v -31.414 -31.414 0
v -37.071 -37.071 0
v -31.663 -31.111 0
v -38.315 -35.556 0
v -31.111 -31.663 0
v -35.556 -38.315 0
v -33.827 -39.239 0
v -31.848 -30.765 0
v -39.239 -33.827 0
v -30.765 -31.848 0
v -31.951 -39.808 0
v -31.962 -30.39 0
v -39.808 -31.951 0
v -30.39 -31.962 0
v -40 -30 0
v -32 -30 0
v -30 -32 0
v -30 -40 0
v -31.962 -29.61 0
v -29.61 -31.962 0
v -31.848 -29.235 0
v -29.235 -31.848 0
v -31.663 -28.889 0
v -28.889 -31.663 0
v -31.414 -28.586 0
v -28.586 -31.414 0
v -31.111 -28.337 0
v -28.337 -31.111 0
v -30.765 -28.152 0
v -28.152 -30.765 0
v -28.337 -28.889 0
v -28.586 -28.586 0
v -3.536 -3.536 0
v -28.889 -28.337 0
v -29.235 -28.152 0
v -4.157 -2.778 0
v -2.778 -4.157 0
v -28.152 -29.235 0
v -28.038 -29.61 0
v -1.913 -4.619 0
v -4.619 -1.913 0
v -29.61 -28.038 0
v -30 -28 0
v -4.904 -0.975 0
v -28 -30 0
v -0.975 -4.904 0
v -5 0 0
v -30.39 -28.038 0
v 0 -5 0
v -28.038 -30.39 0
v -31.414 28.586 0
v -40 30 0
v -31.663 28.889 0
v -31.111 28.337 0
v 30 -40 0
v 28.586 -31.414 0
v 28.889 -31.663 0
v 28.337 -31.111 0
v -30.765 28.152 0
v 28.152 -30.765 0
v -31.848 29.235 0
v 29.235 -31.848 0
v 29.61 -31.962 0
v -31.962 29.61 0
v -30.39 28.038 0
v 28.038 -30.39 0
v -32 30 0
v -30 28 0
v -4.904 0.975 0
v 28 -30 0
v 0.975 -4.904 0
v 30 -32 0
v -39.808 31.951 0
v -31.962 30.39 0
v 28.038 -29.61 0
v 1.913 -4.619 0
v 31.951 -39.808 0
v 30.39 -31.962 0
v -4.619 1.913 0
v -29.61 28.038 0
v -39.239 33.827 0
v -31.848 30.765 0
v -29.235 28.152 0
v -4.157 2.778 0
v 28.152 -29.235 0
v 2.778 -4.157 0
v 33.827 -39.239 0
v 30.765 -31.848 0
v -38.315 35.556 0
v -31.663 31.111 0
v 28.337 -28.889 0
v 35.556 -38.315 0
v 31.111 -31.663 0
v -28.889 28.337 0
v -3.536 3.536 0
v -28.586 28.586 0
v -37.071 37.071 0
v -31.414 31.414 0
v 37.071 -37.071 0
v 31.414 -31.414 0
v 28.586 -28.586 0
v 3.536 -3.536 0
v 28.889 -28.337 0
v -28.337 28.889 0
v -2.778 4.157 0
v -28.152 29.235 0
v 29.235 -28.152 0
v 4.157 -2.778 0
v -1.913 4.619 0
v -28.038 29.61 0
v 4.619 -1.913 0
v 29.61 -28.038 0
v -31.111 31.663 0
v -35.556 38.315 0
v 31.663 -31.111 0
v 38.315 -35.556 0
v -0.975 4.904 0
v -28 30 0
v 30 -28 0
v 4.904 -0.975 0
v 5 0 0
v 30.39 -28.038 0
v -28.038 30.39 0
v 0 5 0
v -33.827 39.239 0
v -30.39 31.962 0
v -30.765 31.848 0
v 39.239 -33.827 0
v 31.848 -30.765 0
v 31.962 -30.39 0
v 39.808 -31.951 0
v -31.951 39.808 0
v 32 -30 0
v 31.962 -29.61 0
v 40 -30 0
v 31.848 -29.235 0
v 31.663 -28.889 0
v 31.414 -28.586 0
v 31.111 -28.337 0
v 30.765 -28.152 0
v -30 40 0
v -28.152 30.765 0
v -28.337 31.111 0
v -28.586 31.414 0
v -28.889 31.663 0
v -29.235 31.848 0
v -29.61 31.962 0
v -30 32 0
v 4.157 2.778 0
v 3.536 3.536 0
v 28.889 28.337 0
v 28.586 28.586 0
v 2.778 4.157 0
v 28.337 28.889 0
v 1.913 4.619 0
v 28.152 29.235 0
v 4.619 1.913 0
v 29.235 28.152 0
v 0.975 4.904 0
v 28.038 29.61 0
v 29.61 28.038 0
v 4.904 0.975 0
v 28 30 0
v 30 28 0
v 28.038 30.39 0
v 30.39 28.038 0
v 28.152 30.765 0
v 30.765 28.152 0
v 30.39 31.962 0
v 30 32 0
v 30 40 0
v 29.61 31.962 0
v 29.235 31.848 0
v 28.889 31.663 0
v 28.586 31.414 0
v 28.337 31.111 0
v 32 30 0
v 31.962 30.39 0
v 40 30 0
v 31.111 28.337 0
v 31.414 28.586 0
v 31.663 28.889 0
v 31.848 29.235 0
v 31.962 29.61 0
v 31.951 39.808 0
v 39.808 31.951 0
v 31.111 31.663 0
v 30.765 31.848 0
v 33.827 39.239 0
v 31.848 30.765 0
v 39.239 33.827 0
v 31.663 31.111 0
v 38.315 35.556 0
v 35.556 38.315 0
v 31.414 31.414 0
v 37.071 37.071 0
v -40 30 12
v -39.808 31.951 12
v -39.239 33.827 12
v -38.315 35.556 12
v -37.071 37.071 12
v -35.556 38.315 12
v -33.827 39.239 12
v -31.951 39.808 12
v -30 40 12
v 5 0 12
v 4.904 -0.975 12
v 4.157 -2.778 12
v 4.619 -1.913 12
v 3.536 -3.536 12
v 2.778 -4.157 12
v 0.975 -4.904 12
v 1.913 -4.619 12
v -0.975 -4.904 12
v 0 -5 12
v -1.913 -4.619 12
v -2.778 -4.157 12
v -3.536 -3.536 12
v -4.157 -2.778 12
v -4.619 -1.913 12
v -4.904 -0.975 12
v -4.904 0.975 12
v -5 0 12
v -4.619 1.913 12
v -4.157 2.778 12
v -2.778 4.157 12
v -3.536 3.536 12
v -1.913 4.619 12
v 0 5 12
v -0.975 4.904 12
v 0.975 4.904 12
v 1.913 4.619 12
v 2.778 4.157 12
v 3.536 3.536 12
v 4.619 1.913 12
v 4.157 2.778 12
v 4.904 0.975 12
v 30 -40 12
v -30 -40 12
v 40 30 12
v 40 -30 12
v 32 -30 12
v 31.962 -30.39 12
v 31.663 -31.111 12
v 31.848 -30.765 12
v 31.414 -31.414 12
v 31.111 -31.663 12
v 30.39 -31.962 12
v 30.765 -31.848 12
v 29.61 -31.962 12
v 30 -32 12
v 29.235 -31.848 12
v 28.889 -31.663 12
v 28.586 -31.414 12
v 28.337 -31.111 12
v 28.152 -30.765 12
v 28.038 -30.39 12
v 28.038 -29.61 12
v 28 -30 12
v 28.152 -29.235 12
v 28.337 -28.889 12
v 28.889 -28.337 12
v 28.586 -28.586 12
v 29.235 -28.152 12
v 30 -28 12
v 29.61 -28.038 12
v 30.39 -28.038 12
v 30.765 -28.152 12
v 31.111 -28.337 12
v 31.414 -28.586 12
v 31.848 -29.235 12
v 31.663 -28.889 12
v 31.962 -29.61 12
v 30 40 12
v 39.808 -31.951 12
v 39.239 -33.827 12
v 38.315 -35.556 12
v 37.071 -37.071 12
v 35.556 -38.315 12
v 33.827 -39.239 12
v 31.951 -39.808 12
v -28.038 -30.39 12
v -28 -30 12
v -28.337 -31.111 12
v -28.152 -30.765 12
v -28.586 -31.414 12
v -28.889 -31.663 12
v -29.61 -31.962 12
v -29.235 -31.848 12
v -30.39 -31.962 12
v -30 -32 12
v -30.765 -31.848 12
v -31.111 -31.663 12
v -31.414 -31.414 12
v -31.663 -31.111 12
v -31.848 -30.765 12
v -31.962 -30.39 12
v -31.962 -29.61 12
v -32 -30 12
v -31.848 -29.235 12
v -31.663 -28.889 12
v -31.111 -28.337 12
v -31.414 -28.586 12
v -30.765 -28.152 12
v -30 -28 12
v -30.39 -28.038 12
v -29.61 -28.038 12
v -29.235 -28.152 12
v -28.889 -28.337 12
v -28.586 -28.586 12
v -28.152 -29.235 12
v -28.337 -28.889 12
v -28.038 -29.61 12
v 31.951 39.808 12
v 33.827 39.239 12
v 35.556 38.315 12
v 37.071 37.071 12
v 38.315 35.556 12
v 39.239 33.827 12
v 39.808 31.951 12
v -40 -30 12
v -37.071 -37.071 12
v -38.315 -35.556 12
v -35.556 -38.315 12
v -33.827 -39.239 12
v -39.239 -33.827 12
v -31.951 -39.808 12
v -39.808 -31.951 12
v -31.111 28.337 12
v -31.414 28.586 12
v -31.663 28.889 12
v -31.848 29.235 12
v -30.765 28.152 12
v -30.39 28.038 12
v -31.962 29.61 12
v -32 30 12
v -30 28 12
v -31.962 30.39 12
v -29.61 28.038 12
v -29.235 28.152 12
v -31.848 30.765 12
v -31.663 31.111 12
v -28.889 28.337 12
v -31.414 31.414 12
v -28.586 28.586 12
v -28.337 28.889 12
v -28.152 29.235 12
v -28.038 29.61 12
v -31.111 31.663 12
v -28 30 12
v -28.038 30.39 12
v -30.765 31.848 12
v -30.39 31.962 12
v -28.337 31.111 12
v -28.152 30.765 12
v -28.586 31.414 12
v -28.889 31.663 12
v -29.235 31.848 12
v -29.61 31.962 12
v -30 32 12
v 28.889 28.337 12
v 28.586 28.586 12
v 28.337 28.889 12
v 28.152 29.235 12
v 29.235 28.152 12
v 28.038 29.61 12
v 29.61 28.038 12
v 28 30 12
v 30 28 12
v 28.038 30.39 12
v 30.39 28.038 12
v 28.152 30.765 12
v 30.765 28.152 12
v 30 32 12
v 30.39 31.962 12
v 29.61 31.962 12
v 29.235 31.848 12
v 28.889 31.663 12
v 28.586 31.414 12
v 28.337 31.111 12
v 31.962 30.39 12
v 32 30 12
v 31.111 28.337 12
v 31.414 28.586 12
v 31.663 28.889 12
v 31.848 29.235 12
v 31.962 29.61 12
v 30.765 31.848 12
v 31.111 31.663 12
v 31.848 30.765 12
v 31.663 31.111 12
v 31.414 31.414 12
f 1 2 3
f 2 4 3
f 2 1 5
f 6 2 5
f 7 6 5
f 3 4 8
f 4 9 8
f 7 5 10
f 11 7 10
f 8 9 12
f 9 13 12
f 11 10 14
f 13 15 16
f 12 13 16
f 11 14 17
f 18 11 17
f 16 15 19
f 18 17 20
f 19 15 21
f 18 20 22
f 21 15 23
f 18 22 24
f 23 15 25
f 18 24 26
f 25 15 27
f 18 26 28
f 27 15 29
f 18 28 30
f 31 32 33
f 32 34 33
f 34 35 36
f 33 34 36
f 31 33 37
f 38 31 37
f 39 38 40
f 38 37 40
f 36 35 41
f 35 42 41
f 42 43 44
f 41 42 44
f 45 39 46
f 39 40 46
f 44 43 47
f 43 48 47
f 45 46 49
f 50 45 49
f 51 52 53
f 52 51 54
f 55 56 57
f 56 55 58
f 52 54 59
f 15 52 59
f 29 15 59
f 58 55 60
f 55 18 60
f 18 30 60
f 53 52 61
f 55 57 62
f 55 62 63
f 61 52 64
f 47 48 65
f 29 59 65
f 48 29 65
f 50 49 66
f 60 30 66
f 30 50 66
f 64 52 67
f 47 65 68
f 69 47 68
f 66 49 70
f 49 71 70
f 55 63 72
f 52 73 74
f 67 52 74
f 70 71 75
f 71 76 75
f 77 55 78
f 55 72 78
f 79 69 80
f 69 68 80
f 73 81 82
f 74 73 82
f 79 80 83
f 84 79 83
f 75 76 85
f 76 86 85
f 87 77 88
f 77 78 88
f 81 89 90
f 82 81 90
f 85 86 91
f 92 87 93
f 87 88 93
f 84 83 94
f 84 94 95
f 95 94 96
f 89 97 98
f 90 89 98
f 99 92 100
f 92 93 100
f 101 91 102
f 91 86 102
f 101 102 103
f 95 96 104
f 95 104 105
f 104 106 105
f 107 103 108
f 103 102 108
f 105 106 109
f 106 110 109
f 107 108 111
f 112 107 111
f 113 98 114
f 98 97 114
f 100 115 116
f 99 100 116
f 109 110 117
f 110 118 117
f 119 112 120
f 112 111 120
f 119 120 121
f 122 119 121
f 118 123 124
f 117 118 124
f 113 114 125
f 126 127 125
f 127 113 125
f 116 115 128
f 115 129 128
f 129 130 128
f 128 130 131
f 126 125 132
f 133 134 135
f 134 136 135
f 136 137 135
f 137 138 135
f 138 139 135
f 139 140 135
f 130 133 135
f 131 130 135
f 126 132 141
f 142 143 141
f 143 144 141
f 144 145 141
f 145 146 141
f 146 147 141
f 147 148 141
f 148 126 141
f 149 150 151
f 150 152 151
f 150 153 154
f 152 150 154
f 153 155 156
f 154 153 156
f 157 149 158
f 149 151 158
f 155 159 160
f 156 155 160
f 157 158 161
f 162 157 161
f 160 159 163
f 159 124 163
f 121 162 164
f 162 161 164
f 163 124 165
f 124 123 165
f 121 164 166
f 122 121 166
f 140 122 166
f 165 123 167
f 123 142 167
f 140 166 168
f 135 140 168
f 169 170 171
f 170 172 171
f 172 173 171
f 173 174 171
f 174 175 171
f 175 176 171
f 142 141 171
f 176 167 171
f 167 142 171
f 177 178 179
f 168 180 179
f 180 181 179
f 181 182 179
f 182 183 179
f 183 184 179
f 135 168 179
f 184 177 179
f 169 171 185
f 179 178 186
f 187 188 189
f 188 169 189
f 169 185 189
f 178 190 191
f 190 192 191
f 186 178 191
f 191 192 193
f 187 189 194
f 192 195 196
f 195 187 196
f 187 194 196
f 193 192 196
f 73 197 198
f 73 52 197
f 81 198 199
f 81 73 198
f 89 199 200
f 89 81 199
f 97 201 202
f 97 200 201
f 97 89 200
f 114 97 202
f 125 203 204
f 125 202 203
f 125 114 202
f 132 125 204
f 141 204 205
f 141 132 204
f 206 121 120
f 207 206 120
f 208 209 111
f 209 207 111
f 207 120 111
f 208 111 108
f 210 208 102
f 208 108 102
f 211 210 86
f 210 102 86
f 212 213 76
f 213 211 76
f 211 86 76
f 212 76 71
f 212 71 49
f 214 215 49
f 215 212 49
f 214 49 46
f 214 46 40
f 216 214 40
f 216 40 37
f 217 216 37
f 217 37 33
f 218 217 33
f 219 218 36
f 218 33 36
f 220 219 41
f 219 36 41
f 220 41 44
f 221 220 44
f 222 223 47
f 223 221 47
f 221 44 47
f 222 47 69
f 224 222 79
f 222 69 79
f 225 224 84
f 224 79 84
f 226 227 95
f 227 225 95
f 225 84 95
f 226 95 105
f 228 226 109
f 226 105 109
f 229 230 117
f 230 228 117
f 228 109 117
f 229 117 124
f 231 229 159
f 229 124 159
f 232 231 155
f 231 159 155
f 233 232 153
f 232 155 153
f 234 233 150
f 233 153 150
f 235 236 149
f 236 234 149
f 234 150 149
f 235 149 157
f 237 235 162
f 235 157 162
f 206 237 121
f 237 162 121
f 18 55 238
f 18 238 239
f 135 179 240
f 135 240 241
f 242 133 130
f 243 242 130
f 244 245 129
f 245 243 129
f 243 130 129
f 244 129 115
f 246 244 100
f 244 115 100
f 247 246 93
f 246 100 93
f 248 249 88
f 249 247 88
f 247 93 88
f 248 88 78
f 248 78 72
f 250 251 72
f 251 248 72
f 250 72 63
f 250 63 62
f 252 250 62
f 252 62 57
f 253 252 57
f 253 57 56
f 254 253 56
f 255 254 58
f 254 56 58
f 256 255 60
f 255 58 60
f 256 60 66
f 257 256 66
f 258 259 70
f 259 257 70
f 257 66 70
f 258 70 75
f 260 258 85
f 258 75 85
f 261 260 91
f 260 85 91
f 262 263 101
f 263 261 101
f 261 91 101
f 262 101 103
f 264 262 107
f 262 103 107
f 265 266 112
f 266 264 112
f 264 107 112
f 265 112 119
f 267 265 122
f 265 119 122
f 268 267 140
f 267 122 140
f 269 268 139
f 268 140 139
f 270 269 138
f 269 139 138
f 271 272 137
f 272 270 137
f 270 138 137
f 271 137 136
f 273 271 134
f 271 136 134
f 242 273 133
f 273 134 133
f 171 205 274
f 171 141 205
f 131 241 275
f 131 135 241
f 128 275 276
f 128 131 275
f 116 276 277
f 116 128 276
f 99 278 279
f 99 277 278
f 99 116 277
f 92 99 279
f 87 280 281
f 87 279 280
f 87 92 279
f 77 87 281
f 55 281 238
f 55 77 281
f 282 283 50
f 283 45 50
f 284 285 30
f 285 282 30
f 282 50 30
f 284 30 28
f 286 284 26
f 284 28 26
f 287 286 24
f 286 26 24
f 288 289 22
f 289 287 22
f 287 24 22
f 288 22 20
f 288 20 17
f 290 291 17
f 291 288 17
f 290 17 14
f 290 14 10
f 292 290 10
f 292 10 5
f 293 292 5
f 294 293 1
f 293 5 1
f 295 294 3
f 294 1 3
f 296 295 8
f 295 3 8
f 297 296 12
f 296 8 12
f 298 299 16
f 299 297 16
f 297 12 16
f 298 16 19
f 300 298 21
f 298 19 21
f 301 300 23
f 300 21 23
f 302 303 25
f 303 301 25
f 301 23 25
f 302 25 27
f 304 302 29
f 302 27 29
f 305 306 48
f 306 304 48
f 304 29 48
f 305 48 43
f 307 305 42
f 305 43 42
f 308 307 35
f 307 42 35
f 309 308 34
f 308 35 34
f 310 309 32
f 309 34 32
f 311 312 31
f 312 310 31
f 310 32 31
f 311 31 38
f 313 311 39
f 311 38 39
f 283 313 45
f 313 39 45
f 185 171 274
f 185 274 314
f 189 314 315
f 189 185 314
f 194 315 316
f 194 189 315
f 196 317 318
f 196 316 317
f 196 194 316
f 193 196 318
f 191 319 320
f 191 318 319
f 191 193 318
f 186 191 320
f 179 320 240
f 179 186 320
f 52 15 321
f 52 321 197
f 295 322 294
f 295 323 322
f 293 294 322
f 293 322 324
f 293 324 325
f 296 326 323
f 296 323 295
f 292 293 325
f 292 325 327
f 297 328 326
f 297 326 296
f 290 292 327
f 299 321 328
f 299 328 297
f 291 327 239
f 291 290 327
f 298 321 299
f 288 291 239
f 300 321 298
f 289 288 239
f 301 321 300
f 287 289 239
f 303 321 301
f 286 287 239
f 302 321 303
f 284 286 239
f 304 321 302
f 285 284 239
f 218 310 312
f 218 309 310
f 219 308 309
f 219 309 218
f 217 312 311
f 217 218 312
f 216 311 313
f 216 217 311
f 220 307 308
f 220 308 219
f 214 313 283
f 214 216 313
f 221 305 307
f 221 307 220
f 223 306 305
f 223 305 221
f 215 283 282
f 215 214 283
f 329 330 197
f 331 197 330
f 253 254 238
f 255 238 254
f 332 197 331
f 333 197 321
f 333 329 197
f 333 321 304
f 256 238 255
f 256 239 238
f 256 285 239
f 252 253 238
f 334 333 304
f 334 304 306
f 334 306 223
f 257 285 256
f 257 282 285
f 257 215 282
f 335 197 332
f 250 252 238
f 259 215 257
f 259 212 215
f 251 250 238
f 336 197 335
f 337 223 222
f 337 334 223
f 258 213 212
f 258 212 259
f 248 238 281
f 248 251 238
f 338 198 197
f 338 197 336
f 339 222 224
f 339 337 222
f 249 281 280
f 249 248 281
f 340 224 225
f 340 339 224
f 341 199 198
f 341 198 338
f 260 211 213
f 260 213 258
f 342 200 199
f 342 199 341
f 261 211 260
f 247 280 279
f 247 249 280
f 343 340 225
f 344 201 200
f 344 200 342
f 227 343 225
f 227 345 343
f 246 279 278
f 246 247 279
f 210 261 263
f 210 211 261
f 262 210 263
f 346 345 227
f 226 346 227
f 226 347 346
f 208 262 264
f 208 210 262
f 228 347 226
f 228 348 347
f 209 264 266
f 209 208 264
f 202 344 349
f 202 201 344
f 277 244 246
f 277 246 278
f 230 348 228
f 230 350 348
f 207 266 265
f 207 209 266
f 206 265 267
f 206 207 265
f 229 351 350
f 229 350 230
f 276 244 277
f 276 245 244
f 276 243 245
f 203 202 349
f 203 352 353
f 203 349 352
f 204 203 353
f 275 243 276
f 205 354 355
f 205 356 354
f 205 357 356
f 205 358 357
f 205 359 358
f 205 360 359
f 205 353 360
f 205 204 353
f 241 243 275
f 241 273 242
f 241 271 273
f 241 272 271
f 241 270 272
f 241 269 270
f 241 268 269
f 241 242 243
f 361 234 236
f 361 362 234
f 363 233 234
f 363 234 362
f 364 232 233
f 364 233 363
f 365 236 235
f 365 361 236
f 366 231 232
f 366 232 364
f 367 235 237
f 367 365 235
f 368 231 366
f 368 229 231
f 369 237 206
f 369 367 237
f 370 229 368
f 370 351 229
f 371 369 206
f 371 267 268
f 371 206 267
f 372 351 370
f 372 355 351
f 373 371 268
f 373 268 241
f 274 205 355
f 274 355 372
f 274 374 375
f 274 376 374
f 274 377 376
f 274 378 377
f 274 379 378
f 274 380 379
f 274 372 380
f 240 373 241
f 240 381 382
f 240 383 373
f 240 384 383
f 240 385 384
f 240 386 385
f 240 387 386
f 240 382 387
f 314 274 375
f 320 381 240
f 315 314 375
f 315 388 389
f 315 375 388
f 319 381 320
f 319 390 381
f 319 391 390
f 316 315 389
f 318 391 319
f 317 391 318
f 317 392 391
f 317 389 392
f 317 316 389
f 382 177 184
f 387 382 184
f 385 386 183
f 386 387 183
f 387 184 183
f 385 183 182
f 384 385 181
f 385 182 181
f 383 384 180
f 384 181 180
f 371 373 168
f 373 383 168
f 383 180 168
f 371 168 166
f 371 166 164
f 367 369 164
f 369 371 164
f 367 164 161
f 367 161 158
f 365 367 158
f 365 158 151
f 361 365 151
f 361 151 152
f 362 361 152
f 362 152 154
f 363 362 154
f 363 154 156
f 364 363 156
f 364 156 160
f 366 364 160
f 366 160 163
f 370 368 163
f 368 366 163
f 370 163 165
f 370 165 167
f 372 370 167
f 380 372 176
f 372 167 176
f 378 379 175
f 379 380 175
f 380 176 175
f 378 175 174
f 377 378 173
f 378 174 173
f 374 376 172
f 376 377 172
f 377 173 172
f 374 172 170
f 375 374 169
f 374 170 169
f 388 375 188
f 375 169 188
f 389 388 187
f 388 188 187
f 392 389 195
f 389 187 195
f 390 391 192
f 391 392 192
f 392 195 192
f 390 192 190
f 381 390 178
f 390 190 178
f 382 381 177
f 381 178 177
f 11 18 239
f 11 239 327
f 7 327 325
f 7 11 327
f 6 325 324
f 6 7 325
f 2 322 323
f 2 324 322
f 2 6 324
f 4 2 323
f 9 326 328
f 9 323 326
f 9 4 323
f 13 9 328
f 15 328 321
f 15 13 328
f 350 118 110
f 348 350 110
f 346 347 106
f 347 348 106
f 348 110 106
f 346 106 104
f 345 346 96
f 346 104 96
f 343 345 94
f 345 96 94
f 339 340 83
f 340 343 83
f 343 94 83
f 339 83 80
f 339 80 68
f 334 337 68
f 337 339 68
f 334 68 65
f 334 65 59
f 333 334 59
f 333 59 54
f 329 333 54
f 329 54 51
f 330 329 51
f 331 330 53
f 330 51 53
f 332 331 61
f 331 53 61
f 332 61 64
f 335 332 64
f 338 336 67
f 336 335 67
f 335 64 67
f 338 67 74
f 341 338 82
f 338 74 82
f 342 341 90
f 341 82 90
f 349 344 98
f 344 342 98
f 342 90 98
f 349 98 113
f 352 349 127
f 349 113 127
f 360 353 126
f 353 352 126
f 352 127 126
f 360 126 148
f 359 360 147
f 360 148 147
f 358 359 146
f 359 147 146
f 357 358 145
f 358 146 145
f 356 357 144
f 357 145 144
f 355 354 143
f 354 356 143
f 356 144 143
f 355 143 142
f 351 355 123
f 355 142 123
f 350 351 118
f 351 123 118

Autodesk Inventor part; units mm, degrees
ref_plane "YZ Plane" through (0, 0, 0) normal (1, 0, 0) x (0, 1, 0)
ref_plane "XZ Plane" through (0, 0, 0) normal (0, 1, 0) x (-1, 0, 0)
ref_plane "Plano de trabalho1" through (0, 0, 0) normal (0, 0, 1) x (1, 0, 0)
sketch "Esboço1" plane through (0, 0, 0) normal (0, 0, 1) x (1, 0, 0)
  arc A0 (-40, -30) -> (-30, -40) centre (-30, -30) ccw
  line L0 (30, -40) -> (-30, -40)
  arc A1 (30, -40) -> (40, -30) centre (30, -30) ccw
  line L1 (40, 30) -> (40, -30)
  arc A2 (40, 30) -> (30, 40) centre (30, 30) ccw
  line L2 (-30, 40) -> (30, 40)
  arc A3 (-30, 40) -> (-40, 30) centre (-30, 30) ccw
  line L3 (-40, -30) -> (-40, 30)
  circle A4 centre (0, 0) radius 5
  circle A5 centre (0, 0) radius 5
  circle A6 centre (30, 30) radius 2
  circle A7 centre (30, -30) radius 2
  circle A8 centre (-30, -30) radius 2
  circle A9 centre (-30, 30) radius 2
  point P0 (0, 0)
  dimension "d0" = 10
  dimension "d3" = 4
  dimension "d4" = 4
  dimension "d5" = 4
  dimension "d6" = 4
extrude "Extrusão1" add sketch "Esboço1" along normal blind 12
equation "\"d3\" = d6"
equation "\"d4\" = d6"
equation "\"d5\" = d6"
properties part number "corpo_01a"
